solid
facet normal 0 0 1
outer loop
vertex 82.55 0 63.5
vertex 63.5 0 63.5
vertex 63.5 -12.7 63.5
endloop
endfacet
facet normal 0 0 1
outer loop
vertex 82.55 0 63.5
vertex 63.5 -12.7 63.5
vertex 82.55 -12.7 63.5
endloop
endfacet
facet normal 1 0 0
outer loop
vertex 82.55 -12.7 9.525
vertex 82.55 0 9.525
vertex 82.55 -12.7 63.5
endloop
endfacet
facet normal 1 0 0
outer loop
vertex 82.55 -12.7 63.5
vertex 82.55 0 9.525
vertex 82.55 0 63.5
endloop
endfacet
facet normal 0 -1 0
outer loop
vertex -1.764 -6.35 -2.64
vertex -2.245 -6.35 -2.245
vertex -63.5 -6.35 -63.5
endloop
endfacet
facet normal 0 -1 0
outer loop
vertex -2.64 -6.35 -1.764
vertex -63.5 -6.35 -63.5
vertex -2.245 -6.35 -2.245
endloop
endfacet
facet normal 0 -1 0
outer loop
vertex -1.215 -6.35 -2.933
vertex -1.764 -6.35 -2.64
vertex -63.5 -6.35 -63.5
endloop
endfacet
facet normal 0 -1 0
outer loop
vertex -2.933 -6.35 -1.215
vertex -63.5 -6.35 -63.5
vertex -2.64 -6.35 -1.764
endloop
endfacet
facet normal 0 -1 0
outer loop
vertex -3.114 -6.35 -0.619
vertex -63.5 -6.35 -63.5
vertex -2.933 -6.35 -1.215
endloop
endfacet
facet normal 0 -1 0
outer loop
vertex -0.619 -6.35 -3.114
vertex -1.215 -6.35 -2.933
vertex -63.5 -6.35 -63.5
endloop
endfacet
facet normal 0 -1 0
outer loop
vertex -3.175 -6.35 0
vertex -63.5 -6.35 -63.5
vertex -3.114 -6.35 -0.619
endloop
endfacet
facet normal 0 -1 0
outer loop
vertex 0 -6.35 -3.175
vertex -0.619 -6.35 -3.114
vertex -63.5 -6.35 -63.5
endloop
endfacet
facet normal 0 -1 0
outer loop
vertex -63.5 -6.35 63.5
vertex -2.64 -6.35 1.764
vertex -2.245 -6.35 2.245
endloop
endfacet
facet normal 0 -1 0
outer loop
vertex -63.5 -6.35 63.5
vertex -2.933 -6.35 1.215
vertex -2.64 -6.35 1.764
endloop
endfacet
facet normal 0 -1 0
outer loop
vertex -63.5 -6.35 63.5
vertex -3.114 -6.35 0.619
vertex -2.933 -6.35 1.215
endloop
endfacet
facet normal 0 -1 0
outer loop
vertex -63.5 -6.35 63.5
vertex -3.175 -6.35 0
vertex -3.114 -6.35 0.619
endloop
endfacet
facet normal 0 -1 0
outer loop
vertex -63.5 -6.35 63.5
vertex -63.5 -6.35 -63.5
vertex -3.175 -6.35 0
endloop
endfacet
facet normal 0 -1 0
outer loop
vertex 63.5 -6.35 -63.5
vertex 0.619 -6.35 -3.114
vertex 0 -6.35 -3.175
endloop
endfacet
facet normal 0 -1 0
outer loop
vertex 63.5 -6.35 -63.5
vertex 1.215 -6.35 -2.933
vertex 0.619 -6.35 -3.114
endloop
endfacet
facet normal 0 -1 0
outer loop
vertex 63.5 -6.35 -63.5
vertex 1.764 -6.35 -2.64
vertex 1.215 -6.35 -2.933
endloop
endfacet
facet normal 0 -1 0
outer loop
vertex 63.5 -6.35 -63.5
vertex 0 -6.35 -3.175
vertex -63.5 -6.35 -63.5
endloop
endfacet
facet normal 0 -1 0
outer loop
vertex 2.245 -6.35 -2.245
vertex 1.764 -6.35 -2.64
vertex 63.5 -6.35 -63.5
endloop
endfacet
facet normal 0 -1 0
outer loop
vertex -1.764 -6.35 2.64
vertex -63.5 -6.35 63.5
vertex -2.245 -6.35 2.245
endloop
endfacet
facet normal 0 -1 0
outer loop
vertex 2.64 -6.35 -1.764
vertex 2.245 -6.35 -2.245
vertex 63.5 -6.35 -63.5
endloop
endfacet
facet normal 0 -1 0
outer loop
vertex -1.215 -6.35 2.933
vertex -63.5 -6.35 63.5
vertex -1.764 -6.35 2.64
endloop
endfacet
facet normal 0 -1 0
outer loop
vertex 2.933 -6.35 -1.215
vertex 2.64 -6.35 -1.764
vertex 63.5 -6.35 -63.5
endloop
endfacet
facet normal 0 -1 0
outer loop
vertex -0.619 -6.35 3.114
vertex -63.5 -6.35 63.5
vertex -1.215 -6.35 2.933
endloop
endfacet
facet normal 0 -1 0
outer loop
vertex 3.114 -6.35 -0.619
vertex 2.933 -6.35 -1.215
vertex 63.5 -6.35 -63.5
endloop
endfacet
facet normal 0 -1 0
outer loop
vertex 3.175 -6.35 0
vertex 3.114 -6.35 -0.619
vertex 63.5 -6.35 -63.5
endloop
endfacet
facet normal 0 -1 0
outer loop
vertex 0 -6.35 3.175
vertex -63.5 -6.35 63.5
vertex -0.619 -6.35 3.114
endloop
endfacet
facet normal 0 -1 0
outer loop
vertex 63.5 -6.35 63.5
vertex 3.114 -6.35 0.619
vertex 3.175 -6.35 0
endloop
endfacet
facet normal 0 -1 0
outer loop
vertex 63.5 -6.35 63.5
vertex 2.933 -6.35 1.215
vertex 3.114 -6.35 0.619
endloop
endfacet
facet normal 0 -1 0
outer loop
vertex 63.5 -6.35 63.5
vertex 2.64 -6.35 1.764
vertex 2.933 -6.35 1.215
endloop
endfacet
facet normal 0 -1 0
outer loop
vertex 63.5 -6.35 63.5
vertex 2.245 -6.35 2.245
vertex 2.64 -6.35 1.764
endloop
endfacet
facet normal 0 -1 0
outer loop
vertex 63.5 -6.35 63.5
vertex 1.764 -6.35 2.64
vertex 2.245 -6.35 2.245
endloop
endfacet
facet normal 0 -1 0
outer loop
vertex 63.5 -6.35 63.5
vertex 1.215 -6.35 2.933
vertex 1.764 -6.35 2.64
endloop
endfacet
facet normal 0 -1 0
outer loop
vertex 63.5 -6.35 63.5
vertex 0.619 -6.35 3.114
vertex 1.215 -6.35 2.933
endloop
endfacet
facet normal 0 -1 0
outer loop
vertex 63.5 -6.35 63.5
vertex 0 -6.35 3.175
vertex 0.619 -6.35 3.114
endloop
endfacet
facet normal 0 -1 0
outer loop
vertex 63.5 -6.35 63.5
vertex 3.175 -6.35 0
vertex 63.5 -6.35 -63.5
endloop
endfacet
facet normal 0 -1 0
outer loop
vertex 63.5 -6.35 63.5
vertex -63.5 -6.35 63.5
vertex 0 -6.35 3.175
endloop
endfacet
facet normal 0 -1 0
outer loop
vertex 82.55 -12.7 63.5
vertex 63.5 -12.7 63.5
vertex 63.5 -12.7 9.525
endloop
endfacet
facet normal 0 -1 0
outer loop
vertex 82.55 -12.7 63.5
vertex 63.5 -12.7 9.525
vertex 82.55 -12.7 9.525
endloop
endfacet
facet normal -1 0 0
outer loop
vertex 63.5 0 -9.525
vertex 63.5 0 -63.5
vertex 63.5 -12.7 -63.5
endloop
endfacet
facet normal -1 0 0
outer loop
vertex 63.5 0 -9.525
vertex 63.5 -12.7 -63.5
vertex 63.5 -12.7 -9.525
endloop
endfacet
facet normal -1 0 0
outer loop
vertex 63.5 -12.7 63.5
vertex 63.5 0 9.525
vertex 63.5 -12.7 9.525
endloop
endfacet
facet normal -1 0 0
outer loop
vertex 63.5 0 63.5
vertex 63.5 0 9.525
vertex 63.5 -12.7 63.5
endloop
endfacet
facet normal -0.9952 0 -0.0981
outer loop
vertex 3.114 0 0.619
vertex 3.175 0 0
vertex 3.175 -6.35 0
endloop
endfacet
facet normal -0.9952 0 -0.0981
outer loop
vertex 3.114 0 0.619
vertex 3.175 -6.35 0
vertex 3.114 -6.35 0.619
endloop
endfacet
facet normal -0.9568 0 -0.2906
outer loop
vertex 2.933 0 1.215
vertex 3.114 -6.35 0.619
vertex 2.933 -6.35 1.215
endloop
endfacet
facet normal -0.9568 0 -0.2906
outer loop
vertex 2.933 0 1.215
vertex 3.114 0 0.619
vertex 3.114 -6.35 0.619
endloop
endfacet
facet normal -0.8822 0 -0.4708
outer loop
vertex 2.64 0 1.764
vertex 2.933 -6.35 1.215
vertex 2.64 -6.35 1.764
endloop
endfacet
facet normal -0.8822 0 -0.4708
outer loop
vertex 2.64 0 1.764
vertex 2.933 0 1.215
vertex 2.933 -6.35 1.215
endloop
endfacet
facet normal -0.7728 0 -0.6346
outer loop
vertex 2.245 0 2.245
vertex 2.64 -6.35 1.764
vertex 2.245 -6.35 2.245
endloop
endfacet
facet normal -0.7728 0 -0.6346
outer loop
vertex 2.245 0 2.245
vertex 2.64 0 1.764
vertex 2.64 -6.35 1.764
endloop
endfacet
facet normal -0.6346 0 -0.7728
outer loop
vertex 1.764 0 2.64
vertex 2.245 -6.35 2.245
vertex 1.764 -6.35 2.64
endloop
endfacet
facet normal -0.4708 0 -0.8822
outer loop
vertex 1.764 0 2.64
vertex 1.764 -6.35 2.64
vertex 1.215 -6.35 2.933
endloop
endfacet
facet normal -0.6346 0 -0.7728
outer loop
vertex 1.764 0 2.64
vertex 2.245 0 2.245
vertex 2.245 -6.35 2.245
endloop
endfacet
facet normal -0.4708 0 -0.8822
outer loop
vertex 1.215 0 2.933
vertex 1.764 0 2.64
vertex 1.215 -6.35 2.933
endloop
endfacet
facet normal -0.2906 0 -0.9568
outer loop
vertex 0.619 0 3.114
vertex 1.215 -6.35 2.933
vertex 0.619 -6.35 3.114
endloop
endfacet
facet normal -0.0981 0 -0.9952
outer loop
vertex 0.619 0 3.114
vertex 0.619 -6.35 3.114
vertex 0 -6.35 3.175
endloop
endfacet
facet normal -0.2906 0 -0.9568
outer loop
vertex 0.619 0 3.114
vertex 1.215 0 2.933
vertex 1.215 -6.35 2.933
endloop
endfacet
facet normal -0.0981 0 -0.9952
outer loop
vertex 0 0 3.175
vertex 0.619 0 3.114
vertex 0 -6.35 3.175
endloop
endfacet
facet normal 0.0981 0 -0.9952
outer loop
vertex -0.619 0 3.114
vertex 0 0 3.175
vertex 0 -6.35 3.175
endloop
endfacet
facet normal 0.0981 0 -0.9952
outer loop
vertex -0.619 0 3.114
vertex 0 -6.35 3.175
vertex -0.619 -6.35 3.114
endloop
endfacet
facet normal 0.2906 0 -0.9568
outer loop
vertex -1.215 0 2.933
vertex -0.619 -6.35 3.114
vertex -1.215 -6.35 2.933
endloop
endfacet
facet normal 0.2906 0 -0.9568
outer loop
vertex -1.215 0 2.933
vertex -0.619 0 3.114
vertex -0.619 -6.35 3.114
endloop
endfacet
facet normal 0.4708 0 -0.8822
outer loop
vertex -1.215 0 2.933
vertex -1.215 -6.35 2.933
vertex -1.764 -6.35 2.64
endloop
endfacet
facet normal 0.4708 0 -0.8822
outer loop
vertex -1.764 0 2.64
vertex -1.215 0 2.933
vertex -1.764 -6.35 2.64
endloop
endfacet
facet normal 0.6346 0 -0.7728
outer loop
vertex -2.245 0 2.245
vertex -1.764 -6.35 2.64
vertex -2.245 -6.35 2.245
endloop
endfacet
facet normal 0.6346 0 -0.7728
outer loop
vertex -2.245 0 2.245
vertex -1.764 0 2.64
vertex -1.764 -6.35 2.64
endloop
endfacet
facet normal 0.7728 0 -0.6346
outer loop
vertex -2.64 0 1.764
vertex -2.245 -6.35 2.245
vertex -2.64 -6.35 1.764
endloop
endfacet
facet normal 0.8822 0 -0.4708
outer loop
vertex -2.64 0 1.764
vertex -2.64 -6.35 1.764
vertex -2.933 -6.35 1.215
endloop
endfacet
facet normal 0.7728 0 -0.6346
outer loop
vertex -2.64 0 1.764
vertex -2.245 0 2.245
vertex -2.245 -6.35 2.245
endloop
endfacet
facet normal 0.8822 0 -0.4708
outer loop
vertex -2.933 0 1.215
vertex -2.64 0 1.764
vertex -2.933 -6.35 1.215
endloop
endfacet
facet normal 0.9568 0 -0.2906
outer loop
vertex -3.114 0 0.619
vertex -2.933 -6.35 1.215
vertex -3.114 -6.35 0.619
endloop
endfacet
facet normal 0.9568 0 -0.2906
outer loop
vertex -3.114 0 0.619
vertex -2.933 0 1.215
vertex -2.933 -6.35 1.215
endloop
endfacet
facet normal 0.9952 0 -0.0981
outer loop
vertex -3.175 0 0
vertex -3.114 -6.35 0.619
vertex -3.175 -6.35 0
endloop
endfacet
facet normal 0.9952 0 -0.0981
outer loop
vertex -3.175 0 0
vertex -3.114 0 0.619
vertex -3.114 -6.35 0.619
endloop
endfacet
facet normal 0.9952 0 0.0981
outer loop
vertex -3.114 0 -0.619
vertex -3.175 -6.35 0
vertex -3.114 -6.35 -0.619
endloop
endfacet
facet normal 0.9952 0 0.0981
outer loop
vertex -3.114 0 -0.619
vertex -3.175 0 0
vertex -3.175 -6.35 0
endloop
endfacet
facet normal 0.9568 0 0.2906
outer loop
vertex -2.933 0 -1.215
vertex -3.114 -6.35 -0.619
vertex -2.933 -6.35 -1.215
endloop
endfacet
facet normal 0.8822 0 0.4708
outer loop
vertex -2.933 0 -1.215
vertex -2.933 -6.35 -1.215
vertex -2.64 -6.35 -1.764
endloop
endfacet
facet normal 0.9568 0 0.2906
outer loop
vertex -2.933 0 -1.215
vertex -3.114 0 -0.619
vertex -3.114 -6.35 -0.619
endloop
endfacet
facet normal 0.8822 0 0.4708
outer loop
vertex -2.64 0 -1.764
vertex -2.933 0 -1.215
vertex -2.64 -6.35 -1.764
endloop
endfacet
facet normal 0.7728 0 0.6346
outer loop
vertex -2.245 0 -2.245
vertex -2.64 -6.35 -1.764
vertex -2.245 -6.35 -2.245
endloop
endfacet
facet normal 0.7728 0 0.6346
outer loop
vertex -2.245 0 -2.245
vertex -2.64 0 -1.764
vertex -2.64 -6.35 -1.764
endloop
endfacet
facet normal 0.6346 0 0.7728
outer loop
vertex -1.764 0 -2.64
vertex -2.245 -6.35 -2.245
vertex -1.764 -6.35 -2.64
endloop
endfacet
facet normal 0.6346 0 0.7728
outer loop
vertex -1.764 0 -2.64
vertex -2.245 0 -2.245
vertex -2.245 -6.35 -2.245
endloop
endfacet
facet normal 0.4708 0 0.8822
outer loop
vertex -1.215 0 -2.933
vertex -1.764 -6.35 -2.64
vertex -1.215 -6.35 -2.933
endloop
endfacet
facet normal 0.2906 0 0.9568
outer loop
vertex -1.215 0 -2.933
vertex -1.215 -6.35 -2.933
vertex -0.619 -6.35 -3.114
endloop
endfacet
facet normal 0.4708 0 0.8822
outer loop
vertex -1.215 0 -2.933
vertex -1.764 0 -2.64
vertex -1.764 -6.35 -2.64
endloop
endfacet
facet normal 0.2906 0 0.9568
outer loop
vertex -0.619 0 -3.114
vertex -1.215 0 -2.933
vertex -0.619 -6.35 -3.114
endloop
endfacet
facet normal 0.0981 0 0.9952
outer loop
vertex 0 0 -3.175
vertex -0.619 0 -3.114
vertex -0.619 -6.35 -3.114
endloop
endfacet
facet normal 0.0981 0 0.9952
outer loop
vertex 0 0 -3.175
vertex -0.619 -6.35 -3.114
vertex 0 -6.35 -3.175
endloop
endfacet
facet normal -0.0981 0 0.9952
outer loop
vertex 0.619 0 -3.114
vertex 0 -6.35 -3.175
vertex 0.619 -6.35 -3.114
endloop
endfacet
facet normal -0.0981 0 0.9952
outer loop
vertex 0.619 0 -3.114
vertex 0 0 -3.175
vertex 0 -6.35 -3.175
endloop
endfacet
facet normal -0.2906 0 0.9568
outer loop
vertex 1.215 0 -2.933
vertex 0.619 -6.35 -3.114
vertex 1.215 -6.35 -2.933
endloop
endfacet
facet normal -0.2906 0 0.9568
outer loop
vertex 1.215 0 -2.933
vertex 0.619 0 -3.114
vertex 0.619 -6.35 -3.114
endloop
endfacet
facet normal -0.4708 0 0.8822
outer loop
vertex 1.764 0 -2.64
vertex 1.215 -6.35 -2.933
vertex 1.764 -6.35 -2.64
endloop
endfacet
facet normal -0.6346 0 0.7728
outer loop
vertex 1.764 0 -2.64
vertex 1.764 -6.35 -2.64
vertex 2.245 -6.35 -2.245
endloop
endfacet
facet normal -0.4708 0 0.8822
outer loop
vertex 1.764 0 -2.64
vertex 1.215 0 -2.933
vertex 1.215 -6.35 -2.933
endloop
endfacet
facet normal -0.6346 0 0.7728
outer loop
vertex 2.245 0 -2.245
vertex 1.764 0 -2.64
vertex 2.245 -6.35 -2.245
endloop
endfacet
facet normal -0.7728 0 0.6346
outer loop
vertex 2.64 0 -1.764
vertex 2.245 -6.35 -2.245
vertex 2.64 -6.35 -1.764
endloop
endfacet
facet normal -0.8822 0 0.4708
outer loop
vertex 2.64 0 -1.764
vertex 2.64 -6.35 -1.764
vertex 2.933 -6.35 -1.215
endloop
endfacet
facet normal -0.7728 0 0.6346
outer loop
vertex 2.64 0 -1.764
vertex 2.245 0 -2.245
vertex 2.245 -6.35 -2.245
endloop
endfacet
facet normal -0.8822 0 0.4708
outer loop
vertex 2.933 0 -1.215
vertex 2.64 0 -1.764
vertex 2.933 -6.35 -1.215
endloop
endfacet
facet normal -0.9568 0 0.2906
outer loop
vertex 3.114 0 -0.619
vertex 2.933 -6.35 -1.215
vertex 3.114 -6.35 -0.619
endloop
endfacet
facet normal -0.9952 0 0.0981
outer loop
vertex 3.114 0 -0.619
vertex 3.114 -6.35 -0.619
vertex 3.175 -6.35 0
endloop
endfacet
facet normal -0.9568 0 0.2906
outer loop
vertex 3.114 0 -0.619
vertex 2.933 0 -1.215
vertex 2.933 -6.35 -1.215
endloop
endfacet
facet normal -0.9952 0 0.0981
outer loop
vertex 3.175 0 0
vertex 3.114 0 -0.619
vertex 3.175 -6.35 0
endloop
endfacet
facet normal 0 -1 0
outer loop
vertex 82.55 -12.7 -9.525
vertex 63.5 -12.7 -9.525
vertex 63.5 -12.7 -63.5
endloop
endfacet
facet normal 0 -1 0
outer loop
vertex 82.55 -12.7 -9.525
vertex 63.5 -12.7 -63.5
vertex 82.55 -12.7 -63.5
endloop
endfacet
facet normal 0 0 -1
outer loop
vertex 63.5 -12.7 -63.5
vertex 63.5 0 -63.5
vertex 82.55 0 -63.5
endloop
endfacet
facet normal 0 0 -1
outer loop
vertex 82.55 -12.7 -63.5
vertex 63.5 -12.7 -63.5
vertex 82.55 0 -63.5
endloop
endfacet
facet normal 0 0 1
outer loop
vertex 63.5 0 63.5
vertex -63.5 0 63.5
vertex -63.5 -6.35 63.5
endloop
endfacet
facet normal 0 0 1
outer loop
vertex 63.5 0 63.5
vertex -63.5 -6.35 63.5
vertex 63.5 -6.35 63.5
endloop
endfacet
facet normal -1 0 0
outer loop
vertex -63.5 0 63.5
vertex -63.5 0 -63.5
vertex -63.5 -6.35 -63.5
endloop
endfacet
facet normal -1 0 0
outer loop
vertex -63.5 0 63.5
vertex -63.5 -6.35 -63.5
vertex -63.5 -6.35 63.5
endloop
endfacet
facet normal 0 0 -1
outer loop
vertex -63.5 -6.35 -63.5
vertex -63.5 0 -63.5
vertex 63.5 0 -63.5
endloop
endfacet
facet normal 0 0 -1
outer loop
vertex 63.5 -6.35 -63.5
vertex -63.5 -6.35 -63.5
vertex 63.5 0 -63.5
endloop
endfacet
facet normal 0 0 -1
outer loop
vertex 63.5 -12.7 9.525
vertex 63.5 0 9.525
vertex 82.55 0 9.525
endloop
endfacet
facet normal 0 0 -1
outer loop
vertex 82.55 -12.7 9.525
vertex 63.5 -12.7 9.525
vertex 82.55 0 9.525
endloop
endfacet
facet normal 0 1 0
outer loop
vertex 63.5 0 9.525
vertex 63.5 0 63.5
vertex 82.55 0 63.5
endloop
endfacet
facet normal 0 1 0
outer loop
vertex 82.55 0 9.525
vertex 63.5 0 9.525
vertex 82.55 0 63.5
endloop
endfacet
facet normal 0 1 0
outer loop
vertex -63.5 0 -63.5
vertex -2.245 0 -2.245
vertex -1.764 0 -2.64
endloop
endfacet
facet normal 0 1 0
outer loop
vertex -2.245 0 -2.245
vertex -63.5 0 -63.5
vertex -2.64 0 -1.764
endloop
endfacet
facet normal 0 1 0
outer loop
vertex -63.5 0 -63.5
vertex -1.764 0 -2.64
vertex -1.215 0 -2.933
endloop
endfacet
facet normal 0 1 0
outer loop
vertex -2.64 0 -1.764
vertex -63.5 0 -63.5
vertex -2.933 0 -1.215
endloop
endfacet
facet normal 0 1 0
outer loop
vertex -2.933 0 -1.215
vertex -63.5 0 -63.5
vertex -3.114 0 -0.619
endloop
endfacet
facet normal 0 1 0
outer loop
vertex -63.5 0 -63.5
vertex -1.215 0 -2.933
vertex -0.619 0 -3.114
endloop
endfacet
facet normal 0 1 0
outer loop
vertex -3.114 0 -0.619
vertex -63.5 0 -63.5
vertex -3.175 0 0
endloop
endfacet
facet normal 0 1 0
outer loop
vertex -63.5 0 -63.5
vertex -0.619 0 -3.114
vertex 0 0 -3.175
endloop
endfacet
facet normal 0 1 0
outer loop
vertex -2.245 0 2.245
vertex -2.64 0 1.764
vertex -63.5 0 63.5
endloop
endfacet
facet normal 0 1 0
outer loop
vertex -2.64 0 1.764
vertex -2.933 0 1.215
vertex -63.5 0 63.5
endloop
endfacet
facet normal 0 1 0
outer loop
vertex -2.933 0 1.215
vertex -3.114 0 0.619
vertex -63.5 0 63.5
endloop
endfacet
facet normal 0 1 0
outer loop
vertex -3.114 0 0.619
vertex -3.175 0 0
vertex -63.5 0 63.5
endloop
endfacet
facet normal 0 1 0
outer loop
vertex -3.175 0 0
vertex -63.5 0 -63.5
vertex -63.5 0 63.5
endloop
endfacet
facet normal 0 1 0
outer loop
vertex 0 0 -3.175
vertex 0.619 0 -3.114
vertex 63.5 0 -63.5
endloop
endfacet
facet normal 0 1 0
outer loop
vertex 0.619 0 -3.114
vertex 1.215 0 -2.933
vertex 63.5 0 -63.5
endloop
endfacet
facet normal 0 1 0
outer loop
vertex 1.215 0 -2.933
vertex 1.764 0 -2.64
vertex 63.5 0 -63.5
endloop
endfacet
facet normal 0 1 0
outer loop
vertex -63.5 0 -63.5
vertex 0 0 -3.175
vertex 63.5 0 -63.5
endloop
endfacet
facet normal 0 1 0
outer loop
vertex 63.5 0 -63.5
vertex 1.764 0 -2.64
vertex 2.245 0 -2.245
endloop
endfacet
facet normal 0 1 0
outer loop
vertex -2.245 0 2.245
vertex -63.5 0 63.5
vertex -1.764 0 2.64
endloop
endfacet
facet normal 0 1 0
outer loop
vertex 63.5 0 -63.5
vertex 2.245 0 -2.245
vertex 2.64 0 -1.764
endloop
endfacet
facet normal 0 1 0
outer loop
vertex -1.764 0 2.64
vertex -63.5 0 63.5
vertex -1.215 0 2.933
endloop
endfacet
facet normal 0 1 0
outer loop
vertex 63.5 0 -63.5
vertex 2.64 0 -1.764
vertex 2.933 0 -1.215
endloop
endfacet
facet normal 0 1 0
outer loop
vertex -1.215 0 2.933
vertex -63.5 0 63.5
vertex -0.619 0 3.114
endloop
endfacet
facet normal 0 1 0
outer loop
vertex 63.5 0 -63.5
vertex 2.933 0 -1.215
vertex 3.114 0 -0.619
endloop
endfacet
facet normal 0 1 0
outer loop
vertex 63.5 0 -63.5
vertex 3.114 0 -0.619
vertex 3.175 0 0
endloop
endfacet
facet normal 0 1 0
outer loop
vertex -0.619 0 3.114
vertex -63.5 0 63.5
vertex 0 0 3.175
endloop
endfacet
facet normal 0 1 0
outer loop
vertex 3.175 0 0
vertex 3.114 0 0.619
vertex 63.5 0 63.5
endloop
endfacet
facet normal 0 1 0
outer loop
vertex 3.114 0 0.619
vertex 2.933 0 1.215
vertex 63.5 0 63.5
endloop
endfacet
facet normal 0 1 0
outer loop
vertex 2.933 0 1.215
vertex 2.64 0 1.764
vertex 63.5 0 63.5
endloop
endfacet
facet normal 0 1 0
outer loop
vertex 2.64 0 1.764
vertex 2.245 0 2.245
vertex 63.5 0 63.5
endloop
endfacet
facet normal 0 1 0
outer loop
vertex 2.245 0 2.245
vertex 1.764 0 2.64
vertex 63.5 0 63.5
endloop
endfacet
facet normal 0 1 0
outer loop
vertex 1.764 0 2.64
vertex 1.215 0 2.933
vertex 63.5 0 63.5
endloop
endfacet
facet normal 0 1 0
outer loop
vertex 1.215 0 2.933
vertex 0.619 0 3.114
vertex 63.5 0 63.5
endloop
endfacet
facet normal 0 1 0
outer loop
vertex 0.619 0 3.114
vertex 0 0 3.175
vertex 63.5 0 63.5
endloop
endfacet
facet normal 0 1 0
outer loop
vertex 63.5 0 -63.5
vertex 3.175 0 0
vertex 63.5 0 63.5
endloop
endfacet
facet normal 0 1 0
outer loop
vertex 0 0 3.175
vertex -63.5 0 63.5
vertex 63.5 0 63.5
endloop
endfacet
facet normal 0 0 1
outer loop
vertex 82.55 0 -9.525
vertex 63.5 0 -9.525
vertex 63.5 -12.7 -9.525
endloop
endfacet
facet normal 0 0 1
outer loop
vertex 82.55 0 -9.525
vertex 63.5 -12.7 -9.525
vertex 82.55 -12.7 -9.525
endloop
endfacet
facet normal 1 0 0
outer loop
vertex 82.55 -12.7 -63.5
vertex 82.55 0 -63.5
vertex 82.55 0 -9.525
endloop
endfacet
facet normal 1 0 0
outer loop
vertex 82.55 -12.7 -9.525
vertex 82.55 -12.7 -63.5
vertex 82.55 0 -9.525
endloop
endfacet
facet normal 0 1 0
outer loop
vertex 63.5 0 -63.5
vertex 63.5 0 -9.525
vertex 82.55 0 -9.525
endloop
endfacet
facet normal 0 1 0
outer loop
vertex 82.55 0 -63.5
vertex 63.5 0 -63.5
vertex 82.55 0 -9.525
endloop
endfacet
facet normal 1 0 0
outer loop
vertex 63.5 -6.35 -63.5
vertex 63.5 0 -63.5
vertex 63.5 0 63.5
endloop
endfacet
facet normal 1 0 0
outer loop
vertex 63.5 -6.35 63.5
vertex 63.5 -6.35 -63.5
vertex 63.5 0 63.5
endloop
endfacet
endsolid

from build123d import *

# Parameters (mm, degrees)
F1_W     = 19.05
F1_H     = 53.975
F2_DEPTH = 12.7
F0_W     = 127
F0_H     = 127
F0_R     = 3.175
F3_DEPTH = 6.35


with BuildPart() as f2:
    # F1 (on Front) → F2 (new body)
    with BuildSketch(Plane.XZ):
        with Locations((73.025, -36.5125)):
            Rectangle(F1_W, F1_H)
        with Locations((73.025, 36.5125)):
            Rectangle(F1_W, F1_H)
    extrude(amount=F2_DEPTH)


with BuildPart() as f3:
    # F0 (on Front) → F3 (new body)
    with BuildSketch(Plane.XZ):
        Rectangle(F0_W, F0_H)
        Circle(F0_R, mode=Mode.SUBTRACT)
    extrude(amount=F3_DEPTH)


solid = Compound([f2.part, f3.part])
